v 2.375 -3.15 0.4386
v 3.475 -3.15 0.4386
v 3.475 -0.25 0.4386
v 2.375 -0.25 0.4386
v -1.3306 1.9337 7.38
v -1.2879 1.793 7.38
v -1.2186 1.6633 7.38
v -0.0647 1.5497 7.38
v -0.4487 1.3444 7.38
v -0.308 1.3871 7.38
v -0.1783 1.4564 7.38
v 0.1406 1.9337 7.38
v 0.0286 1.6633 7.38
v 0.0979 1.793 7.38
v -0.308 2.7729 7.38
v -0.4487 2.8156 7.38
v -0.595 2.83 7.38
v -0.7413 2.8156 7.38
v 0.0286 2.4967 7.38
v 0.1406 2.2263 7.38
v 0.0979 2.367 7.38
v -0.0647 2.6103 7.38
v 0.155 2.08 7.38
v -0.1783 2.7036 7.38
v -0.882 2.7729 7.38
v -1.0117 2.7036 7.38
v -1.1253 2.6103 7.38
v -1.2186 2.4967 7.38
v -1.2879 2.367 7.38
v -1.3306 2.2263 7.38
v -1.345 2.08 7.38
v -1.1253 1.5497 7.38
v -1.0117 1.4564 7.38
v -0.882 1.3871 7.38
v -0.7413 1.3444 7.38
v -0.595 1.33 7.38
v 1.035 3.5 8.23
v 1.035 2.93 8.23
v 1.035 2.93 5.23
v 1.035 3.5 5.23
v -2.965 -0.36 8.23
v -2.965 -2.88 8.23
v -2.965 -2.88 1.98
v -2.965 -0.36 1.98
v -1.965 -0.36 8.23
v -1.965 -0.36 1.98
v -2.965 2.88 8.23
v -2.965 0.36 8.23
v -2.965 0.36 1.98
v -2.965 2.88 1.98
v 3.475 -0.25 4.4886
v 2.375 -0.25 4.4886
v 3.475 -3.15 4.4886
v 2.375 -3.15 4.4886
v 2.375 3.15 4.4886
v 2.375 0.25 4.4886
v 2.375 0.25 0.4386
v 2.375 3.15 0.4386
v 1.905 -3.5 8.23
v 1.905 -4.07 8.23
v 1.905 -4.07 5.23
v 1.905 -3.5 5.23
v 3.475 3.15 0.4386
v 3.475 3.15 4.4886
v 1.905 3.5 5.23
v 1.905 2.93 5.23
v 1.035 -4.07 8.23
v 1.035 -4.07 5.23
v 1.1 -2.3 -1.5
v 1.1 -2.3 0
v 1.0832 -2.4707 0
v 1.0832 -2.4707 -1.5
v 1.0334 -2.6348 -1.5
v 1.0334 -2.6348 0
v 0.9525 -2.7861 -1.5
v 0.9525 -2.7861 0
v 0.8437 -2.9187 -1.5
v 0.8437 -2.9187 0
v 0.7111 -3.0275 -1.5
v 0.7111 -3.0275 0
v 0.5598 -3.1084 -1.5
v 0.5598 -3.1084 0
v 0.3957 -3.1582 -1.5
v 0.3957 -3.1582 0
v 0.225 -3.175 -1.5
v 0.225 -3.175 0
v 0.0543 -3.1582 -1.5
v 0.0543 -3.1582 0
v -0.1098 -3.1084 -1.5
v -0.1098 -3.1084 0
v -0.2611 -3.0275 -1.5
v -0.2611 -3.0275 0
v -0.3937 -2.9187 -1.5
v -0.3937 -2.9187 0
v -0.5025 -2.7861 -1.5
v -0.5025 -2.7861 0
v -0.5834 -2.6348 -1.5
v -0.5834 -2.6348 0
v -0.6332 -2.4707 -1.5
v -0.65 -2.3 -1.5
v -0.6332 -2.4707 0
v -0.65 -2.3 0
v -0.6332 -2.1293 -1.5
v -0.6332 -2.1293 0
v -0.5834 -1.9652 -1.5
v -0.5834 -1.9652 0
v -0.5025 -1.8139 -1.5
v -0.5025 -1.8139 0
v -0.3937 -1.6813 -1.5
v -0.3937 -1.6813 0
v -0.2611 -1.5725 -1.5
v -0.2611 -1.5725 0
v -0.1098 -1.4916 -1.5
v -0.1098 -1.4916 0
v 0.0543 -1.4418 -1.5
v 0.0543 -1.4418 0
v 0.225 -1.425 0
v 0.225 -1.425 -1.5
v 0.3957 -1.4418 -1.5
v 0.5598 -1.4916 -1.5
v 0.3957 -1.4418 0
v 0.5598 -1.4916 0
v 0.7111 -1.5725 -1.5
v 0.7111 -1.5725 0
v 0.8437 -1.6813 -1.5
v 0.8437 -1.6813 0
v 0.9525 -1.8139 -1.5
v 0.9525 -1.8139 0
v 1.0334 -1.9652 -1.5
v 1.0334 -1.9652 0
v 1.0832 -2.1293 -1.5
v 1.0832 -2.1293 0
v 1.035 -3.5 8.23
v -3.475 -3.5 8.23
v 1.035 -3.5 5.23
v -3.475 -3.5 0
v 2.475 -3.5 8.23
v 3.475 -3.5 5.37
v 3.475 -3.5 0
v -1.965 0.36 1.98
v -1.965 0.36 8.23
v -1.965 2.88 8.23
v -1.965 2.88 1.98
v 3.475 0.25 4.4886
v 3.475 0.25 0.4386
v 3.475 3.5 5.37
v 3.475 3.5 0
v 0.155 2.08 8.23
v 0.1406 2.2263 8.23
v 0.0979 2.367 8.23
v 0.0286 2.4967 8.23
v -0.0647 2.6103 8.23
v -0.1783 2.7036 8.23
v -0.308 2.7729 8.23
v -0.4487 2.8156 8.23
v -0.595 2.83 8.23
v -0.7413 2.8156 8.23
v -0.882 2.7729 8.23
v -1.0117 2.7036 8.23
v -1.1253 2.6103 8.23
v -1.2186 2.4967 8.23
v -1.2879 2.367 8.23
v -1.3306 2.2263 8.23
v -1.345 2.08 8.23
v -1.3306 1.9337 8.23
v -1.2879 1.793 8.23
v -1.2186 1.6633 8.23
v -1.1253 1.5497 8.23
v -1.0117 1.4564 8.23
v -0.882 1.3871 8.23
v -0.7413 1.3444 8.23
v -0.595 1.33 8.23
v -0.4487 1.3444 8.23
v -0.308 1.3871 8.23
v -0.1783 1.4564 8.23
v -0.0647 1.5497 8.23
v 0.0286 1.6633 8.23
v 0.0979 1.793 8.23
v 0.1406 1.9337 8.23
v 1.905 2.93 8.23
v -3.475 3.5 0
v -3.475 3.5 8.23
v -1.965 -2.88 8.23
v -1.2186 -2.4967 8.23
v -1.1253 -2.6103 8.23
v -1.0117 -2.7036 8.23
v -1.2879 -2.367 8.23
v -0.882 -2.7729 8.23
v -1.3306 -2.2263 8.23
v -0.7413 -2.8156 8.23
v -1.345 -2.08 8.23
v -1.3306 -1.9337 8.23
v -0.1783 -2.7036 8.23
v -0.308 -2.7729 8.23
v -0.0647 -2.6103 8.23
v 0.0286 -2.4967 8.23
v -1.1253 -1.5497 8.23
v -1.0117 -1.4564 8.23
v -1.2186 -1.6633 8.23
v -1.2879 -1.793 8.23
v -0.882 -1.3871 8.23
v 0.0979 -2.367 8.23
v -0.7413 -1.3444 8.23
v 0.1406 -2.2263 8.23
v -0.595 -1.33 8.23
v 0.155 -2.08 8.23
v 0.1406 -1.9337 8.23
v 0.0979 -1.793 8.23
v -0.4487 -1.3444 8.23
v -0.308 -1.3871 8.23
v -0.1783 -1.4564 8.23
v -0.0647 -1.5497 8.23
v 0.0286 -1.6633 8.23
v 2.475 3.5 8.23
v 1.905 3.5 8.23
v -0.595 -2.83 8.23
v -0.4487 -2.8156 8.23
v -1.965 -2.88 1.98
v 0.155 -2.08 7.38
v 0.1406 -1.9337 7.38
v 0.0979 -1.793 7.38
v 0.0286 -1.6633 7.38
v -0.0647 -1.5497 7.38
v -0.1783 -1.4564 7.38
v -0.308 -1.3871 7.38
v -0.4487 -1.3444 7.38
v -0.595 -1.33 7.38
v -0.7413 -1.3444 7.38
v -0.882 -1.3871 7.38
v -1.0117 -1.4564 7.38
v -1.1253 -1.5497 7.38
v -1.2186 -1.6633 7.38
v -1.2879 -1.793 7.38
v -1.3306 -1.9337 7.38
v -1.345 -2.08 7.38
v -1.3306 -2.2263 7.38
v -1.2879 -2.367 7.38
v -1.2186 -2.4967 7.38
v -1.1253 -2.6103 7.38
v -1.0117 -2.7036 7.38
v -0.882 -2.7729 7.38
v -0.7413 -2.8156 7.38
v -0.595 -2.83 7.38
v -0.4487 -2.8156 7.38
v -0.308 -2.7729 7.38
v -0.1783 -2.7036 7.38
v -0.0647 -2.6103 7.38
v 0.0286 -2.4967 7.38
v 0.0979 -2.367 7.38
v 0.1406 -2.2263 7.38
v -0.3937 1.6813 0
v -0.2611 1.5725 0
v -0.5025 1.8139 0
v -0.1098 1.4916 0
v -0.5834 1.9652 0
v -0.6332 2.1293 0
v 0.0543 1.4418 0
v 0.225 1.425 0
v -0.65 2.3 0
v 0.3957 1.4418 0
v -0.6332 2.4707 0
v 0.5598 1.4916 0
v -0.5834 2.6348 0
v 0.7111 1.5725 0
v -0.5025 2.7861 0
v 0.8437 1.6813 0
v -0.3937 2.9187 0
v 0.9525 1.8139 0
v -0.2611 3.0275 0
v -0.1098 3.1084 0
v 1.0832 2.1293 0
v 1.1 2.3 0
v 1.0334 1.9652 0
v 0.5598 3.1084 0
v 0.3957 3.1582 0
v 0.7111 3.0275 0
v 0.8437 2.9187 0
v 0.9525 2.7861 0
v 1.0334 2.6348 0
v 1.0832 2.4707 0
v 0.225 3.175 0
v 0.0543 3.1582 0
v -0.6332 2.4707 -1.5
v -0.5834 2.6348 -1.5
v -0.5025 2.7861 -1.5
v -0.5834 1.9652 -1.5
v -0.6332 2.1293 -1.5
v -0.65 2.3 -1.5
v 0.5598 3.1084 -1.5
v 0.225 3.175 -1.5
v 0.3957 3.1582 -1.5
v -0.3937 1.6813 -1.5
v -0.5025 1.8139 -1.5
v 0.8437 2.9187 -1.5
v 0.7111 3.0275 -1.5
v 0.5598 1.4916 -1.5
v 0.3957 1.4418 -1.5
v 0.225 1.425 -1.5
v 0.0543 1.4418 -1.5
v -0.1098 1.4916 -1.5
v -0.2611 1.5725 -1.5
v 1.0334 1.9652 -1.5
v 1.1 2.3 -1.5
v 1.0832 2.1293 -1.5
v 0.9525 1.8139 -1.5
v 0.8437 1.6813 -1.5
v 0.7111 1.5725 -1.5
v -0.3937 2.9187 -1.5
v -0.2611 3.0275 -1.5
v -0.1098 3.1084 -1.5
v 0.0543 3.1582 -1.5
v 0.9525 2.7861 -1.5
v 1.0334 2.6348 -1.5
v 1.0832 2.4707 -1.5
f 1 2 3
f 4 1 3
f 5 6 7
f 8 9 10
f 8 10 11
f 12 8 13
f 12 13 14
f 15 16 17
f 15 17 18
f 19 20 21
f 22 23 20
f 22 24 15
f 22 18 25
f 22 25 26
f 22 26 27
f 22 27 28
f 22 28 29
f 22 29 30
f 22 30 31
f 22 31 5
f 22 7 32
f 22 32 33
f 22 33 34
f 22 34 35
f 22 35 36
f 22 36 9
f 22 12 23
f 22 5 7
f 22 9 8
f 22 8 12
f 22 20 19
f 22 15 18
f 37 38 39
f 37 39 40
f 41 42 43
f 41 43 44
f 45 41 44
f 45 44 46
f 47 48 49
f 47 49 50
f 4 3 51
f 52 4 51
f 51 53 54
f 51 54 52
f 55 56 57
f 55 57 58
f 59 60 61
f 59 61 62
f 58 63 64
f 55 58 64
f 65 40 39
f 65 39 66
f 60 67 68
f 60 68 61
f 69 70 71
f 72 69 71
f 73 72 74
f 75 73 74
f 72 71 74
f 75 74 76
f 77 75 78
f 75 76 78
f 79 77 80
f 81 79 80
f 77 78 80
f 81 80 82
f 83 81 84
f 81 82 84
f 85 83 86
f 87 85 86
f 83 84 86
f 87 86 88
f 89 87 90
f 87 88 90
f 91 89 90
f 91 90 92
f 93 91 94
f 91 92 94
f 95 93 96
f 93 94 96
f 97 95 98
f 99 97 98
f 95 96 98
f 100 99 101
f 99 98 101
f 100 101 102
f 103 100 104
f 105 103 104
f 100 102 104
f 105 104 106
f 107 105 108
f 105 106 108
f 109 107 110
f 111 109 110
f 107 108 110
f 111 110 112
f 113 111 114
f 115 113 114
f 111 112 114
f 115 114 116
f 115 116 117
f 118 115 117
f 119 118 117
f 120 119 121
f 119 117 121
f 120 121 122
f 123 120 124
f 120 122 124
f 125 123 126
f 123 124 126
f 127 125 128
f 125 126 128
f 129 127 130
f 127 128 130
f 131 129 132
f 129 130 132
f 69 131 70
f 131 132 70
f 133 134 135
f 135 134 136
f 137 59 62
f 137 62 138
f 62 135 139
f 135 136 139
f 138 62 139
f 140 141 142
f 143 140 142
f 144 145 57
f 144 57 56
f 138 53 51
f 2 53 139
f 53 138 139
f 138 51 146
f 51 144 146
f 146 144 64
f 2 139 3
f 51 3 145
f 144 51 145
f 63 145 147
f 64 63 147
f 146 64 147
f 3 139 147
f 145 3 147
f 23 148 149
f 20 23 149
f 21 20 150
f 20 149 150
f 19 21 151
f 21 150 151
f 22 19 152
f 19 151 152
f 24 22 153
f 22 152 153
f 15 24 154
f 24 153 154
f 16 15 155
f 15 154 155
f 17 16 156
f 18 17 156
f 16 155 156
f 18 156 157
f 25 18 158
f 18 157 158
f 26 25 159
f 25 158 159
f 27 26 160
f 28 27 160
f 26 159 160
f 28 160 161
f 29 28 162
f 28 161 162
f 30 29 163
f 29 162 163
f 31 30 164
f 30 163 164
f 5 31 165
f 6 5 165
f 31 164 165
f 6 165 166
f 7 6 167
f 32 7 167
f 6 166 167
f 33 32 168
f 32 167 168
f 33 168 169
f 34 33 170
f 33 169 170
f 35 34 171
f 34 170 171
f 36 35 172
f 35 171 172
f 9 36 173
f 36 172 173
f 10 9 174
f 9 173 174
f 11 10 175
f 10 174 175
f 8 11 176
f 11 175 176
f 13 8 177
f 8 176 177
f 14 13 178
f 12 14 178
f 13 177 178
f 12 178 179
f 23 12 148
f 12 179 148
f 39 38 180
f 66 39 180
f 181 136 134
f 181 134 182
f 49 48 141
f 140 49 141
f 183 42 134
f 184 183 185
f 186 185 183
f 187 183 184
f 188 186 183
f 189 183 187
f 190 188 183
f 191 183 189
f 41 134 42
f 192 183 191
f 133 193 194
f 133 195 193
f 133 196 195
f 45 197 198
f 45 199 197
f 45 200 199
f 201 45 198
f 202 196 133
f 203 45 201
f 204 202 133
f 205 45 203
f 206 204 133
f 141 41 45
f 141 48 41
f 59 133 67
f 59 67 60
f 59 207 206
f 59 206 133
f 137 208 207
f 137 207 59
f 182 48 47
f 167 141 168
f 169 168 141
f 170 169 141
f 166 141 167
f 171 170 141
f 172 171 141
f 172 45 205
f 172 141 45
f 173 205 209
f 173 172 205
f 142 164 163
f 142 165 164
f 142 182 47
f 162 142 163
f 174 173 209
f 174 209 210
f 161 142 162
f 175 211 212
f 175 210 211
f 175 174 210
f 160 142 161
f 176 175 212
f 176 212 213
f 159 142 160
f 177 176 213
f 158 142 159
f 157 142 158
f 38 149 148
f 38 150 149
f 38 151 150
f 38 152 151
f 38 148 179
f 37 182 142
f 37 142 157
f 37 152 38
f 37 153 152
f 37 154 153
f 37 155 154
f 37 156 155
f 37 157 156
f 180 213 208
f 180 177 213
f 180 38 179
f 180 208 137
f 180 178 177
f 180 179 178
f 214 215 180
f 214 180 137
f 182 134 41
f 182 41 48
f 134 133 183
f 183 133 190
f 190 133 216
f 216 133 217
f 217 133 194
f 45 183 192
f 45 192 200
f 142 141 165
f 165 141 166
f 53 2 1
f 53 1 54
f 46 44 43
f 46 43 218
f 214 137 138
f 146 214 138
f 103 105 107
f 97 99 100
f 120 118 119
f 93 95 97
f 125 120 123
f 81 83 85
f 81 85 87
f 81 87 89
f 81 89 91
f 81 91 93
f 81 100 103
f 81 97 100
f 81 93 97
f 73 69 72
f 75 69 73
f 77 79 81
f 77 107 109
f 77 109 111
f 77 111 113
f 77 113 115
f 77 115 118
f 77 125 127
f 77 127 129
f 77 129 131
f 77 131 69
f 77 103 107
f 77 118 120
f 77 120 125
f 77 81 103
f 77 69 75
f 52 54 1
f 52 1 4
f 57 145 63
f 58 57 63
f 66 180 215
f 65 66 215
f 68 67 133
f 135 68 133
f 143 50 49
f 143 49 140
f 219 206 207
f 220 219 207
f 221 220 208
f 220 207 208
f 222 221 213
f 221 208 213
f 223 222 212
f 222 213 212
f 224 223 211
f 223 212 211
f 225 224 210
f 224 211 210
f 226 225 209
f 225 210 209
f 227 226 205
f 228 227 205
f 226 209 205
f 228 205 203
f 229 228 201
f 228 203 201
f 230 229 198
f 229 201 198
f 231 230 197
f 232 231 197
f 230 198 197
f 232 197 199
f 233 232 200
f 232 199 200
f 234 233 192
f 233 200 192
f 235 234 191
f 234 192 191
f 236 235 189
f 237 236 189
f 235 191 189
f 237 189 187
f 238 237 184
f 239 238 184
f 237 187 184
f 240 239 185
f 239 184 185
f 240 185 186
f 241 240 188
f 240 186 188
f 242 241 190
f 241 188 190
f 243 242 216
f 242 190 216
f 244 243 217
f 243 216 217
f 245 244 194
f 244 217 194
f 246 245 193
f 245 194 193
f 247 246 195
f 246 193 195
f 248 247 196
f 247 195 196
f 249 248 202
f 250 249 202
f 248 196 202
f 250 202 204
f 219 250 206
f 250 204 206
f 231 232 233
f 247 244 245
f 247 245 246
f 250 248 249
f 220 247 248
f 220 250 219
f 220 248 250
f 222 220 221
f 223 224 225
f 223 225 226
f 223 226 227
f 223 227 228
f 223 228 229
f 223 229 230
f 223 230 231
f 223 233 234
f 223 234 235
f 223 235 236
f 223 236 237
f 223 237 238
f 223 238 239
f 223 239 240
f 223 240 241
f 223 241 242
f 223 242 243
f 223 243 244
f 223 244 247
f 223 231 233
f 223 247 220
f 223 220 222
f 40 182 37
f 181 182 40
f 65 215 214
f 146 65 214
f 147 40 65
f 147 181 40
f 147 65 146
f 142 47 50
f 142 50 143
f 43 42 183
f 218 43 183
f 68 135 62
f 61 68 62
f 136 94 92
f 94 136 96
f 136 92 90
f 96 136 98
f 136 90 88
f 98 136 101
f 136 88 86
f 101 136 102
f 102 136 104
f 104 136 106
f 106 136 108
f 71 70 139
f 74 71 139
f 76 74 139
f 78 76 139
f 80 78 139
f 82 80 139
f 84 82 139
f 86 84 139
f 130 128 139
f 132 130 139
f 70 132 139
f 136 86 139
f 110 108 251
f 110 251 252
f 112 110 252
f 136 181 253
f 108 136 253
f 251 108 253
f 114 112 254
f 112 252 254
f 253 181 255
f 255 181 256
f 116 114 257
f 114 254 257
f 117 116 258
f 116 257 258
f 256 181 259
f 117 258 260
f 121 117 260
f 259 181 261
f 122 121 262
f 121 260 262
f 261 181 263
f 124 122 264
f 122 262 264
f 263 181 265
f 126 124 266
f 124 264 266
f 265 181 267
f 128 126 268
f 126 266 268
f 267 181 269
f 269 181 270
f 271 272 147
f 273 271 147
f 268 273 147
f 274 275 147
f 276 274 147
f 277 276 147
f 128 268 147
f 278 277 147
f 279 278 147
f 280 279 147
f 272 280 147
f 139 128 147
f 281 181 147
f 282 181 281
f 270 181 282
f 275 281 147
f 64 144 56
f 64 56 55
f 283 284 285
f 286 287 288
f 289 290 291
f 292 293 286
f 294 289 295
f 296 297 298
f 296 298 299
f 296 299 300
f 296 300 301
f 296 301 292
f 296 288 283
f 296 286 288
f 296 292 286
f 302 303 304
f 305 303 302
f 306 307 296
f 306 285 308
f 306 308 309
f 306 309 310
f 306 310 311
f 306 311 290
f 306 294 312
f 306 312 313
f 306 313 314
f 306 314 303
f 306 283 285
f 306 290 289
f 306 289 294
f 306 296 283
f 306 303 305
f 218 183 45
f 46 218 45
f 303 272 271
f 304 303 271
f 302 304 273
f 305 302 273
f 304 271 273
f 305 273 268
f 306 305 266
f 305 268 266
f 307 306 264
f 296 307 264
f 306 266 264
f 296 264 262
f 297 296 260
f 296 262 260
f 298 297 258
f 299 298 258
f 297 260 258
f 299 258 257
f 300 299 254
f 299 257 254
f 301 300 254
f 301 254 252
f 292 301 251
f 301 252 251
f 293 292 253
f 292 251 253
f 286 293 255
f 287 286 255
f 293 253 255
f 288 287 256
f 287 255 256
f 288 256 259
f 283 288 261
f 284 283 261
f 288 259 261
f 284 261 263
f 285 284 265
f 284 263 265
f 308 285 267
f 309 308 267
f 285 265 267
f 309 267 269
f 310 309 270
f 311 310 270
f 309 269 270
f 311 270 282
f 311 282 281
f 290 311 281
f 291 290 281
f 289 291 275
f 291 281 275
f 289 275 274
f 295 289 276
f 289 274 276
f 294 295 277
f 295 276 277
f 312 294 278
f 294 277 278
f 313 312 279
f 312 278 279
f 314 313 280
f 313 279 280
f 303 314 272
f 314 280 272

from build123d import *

# Parameters (mm, degrees)
F0_W      = 6.95
F0_H      = 7
F1_DEPTH  = 8.23
F3_DEPTH  = 7.001
F4_W      = 2.9
F4_H      = 4.05
F5_DEPTH  = 1.1
F6_W      = 0.87
F6_H      = 0.57
F7_DEPTH  = 3
F8_W      = 0.87
F8_H      = 0.57
F9_DEPTH  = 3
F10_R     = 0.75
F11_DEPTH = 0.85
F12_W     = 1
F12_H     = 2.52
F13_DEPTH = 6.25
F14_R     = 0.875
F15_DEPTH = 1.5


with BuildPart() as f1:
    # F0 (on Top) → F1 (new body)
    with BuildSketch(Plane.XY):
        Rectangle(F0_W, F0_H)
    extrude(amount=F1_DEPTH)

    # F2 (on face) → F3 (cut, through all)
    with BuildSketch(Plane.XZ.offset(3.5)):
        Polygon((3.475, 8.23), (2.475, 8.23), (3.475, 5.37), align=None)
    extrude(amount=-F3_DEPTH, mode=Mode.SUBTRACT)

    # F4 (on face) → F5 (cut)
    with BuildSketch(Plane.YZ.offset(3.475)):
        with Locations((-1.7, 2.4635673035)):
            Rectangle(F4_W, F4_H)
        with Locations((1.7, 2.4635673035)):
            Rectangle(F4_W, F4_H)
    extrude(amount=-F5_DEPTH, mode=Mode.SUBTRACT)

    # F6 (on face) → F7 (join)
    with BuildSketch(Plane.XY.offset(8.23)):
        with Locations((1.47, -3.785)):
            Rectangle(F6_W, F6_H)
    extrude(amount=-F7_DEPTH)

    # F8 (on face) → F9 (cut)
    with BuildSketch(Plane.XY.offset(8.23)):
        with Locations((1.47, 3.215)):
            Rectangle(F8_W, F8_H)
    extrude(amount=-F9_DEPTH, mode=Mode.SUBTRACT)

    # F10 (on face) → F11 (cut)
    with BuildSketch(Plane.XY.offset(8.23)):
        with Locations((-0.595, -2.08)):
            Circle(F10_R)
        with Locations((-0.595, 2.08)):
            Circle(F10_R)
    extrude(amount=-F11_DEPTH, mode=Mode.SUBTRACT)

    # F12 (on face) → F13 (cut)
    with BuildSketch(Plane.XY.offset(8.23)):
        with Locations((-2.465, -1.62)):
            Rectangle(F12_W, F12_H)
        with Locations((-2.465, 1.62)):
            Rectangle(F12_W, F12_H)
    extrude(amount=-F13_DEPTH, mode=Mode.SUBTRACT)

    # F14 (on face) → F15 (join)
    with BuildSketch(Plane(origin=(0, 0, 0), x_dir=(1, 0, 0), z_dir=(0, 0, -1))):
        with Locations((0.225, 2.3)):
            Circle(F14_R)
        with Locations((0.225, -2.3)):
            Circle(F14_R)
    extrude(amount=F15_DEPTH)


solid = f1.part
